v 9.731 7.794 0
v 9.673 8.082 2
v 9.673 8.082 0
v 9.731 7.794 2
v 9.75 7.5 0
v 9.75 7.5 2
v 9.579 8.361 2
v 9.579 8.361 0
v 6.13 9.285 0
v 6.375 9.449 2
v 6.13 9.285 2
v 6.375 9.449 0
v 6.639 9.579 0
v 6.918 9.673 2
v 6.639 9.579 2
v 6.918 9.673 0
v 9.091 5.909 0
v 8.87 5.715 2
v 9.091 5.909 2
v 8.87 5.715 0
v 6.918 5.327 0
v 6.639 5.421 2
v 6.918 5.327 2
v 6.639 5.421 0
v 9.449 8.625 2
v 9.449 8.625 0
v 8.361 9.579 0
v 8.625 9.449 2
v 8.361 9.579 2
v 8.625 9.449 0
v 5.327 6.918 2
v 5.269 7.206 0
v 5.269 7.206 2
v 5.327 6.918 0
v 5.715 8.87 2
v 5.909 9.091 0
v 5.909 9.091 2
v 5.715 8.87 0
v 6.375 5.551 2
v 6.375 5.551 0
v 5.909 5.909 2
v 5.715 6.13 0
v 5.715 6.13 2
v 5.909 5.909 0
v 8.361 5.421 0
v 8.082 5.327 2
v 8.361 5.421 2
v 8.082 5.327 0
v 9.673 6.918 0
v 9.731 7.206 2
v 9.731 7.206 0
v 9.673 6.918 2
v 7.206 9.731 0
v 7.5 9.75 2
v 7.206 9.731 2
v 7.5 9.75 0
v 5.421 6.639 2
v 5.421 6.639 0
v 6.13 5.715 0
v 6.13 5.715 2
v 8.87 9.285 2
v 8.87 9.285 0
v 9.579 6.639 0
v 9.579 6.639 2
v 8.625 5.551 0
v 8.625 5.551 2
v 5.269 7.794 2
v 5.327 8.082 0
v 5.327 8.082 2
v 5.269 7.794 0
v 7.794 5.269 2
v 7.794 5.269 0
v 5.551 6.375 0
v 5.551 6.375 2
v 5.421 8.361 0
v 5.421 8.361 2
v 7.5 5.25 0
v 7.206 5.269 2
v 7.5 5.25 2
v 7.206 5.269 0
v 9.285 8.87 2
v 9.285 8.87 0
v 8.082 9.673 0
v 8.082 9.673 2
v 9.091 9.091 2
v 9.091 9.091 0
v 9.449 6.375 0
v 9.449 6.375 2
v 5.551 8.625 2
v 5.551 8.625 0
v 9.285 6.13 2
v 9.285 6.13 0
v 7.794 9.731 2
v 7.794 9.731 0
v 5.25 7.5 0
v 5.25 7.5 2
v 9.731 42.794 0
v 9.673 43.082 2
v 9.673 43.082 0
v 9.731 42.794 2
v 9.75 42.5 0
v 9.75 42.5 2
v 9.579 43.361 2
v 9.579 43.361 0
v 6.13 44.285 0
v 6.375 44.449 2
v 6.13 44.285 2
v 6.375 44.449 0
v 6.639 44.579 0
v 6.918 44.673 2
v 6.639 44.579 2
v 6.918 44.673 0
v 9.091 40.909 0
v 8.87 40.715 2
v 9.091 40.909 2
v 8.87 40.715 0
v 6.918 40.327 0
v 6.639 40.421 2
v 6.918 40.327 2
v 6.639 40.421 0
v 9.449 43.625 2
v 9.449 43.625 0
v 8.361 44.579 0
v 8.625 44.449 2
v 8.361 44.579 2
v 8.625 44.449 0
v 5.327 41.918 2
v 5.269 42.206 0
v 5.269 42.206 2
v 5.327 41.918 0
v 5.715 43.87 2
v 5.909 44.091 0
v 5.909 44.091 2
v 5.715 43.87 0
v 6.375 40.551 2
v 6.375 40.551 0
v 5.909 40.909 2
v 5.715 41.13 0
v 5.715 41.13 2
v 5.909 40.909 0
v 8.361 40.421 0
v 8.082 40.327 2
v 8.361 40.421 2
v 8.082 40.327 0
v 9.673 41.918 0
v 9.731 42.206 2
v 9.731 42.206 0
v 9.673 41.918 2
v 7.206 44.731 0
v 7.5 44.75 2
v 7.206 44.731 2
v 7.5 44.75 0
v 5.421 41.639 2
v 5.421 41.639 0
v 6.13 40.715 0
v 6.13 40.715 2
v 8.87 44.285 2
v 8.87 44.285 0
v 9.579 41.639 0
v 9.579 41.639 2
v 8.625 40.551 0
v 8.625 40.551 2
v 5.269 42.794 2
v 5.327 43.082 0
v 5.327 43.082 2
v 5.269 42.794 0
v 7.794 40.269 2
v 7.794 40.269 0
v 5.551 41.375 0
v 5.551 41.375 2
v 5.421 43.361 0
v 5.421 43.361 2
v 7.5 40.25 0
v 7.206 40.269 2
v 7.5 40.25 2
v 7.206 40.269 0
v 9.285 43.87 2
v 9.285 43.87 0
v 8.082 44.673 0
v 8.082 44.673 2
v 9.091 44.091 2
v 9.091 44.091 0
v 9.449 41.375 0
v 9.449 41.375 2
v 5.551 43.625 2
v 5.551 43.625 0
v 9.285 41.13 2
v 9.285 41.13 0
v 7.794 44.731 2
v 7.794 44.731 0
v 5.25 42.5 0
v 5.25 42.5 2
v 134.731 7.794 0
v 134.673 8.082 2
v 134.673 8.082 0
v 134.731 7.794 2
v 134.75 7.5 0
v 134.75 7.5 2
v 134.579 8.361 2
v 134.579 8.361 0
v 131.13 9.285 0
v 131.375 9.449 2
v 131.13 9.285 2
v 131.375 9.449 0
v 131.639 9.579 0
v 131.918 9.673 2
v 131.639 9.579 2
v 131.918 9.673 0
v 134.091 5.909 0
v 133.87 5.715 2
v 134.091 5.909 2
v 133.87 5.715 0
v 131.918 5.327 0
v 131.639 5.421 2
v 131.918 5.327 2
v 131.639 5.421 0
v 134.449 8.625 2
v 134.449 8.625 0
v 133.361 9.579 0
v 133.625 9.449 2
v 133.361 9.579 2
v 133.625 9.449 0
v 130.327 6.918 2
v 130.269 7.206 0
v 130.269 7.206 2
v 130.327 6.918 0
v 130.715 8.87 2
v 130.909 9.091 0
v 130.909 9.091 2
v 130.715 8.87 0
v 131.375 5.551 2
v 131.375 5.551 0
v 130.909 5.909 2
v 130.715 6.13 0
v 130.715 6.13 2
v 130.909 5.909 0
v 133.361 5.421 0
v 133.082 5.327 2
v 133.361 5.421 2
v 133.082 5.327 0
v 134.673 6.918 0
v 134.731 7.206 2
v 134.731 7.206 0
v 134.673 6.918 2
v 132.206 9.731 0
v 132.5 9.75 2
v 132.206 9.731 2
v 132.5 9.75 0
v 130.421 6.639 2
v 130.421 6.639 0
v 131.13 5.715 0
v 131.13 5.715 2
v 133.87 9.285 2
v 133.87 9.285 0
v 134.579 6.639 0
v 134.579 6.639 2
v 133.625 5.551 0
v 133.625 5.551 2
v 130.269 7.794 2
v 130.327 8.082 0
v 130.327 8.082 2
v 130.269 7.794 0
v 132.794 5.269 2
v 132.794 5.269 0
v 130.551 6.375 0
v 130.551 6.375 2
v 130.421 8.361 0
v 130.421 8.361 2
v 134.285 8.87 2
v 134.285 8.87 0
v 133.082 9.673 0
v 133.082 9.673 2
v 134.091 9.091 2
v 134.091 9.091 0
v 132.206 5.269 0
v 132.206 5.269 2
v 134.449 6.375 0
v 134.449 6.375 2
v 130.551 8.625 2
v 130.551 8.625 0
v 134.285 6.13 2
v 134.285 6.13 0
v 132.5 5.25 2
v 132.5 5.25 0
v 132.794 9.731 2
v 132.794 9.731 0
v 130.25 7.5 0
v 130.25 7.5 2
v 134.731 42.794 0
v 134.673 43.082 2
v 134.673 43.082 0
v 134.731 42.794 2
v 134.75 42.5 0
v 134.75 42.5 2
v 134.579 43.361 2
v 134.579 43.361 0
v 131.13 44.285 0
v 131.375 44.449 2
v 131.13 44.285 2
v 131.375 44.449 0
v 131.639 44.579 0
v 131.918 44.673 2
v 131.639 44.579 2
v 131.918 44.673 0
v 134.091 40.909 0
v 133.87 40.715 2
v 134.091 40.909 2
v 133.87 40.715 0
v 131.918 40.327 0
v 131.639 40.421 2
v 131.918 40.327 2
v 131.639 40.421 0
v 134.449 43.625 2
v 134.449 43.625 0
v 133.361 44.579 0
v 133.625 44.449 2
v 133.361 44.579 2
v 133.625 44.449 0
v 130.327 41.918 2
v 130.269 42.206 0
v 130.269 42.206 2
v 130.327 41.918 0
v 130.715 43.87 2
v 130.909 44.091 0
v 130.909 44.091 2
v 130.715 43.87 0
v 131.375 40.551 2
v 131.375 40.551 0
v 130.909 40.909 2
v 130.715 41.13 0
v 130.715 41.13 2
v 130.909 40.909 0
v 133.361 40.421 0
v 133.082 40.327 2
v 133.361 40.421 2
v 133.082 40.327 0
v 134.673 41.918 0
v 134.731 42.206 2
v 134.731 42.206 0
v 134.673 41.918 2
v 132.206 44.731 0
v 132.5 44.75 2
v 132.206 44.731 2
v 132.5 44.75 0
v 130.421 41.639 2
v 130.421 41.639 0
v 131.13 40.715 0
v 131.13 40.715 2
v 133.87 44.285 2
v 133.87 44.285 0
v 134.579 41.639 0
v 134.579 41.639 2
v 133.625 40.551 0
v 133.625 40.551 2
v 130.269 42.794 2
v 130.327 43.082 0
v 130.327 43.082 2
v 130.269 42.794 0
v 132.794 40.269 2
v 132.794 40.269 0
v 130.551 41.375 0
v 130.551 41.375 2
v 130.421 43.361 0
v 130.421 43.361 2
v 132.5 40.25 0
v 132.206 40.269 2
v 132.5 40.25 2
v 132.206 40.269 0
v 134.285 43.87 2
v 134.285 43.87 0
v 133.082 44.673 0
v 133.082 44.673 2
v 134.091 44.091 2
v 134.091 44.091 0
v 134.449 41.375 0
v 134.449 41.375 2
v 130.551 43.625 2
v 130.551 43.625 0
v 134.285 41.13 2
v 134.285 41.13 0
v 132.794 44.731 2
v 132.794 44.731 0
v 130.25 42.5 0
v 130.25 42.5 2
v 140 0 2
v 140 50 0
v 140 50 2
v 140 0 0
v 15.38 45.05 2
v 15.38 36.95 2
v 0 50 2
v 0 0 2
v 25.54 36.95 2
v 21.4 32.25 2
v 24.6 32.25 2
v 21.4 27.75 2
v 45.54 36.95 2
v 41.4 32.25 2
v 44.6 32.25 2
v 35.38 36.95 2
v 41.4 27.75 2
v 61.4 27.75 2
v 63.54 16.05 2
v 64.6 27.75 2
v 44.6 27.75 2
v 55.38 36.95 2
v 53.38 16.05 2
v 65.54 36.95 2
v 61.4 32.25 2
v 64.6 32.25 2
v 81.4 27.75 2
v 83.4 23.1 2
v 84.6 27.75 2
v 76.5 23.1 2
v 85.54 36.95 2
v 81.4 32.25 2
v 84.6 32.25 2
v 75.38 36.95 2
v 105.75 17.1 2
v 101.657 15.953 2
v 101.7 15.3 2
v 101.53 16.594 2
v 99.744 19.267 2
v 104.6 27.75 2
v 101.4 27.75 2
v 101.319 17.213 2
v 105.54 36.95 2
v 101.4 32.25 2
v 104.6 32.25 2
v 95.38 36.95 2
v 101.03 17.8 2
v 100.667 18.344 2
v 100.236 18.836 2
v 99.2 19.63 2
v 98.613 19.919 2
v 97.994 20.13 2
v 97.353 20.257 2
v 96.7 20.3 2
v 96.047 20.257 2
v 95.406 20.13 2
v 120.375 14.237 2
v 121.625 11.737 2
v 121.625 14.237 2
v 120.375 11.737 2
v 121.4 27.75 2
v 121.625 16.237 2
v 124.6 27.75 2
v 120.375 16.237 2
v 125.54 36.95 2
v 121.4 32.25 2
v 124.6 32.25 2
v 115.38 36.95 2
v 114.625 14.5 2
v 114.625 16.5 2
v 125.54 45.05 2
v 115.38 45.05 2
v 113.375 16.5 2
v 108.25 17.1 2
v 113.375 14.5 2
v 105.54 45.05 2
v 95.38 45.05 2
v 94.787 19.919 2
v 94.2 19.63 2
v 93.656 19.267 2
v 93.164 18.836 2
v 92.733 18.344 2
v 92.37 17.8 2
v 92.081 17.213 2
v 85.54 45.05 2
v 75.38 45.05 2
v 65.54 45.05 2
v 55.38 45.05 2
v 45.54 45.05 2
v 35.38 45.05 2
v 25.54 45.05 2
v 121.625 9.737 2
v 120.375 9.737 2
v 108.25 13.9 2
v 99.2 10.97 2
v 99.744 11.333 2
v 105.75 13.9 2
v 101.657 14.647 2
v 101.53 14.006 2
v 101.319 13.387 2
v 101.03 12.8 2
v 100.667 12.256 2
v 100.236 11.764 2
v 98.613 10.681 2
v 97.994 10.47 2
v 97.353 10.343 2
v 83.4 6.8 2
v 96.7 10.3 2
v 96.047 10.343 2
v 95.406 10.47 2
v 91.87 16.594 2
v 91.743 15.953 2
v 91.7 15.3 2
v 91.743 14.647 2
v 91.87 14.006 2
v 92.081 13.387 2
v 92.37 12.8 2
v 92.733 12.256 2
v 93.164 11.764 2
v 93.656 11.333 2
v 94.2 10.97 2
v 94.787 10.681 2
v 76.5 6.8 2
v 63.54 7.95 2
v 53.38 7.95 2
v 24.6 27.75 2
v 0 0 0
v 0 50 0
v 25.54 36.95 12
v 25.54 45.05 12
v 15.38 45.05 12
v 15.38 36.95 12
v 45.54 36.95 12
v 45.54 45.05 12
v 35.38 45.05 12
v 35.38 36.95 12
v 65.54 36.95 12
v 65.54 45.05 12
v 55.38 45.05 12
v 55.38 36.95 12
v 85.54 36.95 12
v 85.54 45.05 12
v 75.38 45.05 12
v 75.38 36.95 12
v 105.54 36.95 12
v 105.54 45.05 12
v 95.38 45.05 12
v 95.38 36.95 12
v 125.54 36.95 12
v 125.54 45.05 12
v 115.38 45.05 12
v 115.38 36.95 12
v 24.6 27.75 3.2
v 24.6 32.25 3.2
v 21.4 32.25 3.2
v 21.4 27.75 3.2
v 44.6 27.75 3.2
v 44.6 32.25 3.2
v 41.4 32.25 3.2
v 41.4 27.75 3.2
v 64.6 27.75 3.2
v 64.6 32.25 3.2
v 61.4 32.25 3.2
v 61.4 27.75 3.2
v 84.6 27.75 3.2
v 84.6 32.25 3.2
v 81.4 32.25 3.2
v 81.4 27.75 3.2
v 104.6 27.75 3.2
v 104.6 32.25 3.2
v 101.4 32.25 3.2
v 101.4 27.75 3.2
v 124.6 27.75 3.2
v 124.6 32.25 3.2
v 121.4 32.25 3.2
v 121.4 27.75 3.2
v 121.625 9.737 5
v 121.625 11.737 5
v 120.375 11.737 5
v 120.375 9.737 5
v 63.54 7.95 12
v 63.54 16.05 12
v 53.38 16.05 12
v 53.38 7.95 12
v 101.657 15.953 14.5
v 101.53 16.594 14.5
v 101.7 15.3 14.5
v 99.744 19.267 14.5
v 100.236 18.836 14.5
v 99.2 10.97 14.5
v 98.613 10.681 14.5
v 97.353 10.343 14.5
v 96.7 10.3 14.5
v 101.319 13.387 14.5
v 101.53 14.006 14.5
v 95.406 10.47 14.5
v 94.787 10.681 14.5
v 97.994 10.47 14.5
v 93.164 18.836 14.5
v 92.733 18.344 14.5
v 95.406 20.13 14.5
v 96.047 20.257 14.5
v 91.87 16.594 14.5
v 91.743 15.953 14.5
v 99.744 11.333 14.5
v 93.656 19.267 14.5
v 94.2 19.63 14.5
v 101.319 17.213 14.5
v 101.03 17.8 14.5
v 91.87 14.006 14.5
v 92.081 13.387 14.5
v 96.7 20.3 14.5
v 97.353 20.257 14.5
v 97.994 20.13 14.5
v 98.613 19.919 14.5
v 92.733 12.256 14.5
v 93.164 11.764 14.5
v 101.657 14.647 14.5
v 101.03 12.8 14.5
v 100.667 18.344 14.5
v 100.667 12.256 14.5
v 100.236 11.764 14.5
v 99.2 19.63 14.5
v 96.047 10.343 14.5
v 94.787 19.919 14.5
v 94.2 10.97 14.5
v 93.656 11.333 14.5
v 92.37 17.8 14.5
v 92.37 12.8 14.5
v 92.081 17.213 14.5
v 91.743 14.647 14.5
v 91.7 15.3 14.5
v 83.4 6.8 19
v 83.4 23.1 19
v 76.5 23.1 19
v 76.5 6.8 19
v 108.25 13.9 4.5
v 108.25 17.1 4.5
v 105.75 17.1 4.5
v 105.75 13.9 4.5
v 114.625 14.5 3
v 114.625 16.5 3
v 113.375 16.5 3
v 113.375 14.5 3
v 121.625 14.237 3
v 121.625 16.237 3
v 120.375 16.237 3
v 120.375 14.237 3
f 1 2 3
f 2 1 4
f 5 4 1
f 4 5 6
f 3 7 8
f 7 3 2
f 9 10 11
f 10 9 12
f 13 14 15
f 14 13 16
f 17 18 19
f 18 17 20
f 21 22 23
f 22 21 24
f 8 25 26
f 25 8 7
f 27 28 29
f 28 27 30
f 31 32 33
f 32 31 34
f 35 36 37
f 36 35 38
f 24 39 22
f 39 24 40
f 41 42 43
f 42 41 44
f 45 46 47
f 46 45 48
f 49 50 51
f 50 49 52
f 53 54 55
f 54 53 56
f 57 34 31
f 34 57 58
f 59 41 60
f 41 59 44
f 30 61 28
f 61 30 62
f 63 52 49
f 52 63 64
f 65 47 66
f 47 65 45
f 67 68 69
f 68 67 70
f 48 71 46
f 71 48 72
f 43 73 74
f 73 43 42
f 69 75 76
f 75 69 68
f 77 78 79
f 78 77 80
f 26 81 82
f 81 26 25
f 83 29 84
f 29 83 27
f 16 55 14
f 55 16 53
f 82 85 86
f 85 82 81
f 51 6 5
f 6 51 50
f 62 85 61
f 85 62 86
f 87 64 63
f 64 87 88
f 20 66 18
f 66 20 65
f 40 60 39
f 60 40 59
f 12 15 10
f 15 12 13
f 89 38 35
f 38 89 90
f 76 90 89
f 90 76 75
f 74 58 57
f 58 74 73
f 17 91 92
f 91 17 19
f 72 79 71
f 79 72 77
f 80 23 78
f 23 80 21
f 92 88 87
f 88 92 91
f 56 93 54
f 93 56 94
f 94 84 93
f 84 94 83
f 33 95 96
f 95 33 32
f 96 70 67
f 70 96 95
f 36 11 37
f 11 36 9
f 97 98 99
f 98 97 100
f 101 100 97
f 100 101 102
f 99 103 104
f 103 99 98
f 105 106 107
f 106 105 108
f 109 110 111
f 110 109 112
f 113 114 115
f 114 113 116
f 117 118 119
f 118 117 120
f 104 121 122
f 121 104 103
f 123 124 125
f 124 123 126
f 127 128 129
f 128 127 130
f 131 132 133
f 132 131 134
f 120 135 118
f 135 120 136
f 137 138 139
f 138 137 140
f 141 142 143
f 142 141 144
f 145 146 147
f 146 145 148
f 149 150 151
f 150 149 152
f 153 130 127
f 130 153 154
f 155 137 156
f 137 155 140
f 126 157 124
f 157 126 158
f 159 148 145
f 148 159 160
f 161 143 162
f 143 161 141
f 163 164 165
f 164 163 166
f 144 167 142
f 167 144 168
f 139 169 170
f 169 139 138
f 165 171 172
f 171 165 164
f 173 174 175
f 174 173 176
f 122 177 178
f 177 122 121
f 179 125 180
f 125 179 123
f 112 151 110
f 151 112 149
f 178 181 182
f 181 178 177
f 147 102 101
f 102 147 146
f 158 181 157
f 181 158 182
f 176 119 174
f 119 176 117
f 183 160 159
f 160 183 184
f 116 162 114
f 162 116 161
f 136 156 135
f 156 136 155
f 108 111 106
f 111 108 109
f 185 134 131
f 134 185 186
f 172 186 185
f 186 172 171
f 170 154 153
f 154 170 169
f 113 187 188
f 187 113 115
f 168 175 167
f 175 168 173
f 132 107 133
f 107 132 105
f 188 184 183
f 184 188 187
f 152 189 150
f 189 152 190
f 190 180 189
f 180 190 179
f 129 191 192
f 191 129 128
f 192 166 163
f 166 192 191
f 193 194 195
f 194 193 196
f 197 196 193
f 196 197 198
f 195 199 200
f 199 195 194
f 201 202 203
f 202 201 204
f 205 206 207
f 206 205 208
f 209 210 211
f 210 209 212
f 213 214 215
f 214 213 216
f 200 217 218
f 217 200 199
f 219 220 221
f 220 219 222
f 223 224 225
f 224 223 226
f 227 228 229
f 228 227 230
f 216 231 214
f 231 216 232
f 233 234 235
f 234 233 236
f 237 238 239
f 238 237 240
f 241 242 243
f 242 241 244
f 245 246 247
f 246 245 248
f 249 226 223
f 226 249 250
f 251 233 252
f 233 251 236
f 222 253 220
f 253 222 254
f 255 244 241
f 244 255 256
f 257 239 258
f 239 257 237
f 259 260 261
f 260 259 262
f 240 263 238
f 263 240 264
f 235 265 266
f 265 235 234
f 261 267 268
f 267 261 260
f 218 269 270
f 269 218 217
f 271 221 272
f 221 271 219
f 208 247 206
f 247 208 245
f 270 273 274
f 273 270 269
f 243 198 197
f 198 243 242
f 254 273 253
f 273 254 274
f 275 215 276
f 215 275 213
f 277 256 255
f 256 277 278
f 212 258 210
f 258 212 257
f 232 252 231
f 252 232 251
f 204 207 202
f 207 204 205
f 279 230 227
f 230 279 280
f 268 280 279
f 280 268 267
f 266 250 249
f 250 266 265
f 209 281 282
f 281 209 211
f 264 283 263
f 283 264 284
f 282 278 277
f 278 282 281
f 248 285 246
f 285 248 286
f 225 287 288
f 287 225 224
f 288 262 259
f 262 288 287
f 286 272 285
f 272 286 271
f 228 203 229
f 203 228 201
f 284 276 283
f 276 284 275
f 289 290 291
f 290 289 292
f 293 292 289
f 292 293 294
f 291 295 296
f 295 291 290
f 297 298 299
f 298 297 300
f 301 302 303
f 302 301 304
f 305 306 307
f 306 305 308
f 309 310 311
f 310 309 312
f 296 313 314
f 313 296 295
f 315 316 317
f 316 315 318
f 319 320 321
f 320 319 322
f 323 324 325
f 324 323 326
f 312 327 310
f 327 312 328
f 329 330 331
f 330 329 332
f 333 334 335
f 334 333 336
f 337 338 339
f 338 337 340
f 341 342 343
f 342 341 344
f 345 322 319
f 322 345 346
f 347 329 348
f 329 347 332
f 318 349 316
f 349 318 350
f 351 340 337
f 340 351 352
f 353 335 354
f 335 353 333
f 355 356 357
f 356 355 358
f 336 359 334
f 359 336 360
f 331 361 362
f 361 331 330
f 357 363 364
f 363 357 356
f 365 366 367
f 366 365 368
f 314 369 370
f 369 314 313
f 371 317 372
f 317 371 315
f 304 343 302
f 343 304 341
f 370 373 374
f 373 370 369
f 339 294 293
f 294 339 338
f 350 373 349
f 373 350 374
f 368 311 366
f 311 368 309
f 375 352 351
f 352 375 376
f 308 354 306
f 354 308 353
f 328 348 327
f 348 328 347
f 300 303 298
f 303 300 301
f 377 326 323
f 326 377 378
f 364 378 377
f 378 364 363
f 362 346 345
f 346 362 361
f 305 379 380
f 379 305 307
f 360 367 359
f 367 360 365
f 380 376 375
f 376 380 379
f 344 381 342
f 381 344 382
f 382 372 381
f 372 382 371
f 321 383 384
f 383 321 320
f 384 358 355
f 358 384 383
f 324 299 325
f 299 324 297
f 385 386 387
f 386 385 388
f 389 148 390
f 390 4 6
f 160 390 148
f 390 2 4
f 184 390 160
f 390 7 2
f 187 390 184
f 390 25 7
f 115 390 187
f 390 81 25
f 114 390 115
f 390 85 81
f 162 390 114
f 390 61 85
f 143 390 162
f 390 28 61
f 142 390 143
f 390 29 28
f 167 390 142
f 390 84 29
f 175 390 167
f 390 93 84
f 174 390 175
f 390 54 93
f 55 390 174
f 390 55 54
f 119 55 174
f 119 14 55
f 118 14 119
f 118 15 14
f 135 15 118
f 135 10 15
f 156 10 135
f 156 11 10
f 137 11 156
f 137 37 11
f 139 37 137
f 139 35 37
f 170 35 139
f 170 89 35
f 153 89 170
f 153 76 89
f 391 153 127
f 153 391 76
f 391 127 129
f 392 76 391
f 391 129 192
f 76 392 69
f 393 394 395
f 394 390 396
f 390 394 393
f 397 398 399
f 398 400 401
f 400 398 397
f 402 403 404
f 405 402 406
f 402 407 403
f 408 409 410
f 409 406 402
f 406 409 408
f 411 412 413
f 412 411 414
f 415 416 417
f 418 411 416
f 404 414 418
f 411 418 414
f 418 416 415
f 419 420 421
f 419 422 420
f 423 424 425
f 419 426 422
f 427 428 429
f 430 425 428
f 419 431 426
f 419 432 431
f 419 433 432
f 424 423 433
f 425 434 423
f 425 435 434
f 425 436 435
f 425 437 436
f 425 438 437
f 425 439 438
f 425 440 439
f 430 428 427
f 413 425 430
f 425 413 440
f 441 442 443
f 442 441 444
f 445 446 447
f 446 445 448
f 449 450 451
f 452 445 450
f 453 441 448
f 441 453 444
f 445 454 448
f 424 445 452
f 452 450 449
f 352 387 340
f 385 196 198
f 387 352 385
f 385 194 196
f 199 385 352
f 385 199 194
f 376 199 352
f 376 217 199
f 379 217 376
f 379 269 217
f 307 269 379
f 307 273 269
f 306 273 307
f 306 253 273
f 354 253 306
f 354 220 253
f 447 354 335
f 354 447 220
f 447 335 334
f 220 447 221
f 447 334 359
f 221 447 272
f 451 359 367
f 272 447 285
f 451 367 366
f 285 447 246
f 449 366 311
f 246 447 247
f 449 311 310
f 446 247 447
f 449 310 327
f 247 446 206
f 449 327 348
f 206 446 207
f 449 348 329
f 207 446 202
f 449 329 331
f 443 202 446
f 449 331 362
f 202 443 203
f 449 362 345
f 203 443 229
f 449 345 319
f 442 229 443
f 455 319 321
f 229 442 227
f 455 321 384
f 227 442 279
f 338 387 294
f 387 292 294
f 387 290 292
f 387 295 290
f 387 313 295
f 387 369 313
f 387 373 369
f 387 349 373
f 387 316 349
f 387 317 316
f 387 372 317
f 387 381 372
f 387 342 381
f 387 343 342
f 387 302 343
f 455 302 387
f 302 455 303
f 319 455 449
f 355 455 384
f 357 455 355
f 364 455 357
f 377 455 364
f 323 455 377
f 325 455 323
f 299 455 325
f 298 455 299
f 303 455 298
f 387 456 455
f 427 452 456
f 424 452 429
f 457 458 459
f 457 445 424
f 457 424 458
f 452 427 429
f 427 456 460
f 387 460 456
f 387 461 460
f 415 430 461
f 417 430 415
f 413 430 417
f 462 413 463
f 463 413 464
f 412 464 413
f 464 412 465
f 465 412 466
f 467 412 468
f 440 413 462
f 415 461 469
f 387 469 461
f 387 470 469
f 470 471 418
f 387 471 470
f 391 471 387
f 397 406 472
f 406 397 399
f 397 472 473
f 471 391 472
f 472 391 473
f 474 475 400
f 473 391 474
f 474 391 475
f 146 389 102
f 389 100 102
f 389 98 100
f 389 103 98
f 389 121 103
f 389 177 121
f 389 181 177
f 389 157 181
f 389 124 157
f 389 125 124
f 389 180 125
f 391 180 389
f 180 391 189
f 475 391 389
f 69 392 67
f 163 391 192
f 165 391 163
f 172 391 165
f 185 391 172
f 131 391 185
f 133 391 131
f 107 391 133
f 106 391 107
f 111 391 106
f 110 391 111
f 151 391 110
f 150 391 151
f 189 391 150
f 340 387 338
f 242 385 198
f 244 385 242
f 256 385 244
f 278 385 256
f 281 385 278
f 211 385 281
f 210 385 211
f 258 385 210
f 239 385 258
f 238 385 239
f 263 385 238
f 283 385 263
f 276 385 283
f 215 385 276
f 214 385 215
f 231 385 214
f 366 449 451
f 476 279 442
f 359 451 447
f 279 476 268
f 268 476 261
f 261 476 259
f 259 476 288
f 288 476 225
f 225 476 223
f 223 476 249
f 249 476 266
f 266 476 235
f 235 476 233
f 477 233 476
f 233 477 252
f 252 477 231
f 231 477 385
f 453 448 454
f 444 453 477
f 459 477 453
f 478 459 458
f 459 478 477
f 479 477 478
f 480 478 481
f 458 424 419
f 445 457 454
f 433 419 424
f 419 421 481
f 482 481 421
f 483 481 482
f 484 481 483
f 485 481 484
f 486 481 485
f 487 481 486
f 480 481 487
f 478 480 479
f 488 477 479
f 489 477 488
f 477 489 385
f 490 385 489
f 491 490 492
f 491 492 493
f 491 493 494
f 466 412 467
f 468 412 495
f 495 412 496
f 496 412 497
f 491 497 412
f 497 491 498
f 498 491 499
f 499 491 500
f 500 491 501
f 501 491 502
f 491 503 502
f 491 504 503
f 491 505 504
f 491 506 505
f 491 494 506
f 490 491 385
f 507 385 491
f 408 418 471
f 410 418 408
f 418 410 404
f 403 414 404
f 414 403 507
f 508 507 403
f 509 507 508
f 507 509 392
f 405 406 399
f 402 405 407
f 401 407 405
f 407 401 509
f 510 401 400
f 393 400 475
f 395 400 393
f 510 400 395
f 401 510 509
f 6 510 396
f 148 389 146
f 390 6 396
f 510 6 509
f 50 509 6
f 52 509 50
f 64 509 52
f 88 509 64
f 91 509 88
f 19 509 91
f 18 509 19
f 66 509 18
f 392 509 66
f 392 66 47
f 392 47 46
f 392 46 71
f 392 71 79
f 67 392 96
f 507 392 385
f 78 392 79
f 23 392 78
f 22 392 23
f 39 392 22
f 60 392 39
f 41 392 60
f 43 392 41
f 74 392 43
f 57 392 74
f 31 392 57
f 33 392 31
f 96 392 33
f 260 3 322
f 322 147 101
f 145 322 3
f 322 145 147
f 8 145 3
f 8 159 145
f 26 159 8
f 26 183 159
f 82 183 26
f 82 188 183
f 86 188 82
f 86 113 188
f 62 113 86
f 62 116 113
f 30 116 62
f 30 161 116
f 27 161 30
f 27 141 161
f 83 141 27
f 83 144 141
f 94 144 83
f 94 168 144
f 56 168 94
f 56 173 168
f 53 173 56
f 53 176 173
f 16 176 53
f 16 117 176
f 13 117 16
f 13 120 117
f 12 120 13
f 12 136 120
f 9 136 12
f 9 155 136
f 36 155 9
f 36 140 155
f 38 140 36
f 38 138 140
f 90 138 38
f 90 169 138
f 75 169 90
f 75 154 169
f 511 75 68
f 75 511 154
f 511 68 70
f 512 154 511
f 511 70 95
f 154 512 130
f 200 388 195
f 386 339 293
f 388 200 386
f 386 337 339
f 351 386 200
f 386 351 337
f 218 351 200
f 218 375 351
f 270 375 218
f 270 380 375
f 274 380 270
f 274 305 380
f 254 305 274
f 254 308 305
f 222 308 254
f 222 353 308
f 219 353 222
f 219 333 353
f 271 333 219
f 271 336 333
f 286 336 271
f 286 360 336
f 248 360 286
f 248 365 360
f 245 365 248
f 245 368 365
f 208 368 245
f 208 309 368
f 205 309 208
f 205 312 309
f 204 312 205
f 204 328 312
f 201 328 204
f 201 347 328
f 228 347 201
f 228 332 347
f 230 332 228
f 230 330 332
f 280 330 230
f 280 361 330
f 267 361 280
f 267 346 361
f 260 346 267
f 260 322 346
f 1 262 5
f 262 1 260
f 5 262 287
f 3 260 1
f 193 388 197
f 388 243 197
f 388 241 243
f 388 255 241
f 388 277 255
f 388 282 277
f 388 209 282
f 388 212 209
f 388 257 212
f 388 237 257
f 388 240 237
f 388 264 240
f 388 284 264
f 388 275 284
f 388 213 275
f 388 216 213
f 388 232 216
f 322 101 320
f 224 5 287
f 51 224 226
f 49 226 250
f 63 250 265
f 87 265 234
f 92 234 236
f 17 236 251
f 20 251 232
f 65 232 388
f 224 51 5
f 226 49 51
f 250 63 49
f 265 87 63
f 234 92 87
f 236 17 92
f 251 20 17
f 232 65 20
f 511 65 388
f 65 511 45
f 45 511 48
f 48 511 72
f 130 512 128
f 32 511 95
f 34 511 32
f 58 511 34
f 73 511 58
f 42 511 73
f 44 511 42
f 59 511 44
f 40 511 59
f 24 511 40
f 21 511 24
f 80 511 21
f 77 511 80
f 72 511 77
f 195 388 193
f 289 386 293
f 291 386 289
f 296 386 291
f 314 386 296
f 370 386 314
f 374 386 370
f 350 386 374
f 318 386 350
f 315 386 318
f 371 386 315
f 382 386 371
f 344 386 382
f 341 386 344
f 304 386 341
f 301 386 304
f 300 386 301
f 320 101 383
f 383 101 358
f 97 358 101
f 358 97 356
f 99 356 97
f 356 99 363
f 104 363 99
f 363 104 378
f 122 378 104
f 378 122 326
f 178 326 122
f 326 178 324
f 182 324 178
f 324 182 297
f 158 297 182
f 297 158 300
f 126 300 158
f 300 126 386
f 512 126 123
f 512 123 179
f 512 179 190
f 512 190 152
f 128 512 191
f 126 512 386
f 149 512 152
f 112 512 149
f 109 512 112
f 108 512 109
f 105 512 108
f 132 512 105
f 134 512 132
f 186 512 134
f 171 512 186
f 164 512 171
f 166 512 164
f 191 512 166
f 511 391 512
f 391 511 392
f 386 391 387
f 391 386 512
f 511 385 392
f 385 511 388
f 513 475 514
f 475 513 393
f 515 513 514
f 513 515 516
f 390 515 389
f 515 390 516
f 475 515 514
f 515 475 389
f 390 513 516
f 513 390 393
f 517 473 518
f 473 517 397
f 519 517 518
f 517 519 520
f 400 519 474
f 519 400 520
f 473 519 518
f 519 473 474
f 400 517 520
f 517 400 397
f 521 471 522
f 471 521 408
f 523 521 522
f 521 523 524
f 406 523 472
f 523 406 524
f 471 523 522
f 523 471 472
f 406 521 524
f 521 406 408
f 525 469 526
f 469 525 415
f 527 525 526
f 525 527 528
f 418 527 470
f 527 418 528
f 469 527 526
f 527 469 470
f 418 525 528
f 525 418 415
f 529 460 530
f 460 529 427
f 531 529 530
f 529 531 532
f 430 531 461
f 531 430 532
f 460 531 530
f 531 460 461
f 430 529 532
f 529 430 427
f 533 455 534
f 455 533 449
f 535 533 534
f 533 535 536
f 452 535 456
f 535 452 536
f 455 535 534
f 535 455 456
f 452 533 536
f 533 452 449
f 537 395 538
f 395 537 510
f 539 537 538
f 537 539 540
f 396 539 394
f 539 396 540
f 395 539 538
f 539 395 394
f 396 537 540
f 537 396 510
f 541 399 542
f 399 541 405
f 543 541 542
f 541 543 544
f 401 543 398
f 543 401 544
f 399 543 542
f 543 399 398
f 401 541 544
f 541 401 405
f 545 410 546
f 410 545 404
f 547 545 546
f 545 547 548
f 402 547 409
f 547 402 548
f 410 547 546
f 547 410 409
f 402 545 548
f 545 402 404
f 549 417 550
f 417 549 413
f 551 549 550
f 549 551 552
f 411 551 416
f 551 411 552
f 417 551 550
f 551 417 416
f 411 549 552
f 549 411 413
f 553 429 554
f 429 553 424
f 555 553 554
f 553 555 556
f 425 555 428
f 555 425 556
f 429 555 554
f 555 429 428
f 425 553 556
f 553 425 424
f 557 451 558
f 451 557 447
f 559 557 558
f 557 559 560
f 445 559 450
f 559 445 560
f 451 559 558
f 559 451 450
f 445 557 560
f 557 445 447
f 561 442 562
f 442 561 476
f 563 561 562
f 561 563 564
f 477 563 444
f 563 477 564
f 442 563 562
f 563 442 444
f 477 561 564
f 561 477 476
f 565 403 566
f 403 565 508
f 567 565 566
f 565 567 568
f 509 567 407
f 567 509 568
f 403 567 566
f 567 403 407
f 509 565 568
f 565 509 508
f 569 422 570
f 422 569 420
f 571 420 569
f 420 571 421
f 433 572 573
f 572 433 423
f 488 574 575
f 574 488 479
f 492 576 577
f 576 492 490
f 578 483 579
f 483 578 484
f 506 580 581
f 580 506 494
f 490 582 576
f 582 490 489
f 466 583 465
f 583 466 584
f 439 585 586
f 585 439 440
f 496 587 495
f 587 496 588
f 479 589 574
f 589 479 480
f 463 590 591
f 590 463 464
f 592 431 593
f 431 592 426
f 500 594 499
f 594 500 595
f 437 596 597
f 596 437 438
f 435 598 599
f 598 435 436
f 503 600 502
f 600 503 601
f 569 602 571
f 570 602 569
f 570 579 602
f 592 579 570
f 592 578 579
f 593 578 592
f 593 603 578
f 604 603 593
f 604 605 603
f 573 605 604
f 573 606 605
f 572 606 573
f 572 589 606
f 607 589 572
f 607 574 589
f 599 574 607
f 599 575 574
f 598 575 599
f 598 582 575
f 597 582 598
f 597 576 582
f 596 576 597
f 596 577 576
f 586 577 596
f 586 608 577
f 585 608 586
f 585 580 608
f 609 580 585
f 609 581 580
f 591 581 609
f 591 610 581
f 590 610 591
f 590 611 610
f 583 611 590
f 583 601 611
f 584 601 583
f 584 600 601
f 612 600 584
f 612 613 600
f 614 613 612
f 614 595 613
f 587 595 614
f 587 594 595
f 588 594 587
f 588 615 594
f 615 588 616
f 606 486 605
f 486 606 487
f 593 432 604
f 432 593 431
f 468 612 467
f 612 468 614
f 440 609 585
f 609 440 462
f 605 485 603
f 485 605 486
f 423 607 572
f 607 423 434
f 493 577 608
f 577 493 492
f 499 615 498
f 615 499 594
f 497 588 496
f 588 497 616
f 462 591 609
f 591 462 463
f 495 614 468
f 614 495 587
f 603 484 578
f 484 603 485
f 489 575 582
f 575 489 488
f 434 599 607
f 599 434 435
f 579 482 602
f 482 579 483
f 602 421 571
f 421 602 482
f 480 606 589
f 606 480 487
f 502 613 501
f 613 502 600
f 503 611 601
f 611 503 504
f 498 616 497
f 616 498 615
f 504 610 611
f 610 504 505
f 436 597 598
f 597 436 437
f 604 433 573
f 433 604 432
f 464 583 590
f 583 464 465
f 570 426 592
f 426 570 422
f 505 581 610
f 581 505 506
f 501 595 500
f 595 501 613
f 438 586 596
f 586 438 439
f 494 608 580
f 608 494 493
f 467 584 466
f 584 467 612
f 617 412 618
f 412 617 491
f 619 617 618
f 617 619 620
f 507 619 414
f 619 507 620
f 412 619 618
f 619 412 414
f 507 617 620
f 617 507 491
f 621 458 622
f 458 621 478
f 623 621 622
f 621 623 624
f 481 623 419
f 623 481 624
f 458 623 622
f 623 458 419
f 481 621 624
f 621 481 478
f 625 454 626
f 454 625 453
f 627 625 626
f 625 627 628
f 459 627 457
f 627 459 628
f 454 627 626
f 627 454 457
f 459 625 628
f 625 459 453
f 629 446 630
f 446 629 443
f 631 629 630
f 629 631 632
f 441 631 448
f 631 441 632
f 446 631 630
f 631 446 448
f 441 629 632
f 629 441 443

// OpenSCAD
// Yahrzeit power-distribution board wall enclosure
// Units: millimeters
//
// Print the tray with its wall-facing surface on the bed. Print the cover
// front-face-down. The cover lifts straight away from the wall without
// disconnecting field wiring.

/* [Part] */
part = "pcb_mockup"; // [tray,cover,assembly,pcb_mockup,fit_coupon]

/* [PCB] */
board_w = 140;
board_h = 50;
board_t = 2.0;
board_hole_inset = 7.5;
board_hole_d = 4.5;

/* [Enclosure] */
wall = 2.4;
// 8.25 mm keeps the strengthened cover posts outside the PCB outline.
board_clearance = 8.25;
tray_w = board_w + 2 * board_clearance;
tray_h = board_h + 2 * board_clearance;
tray_t = 2.8;
max_component_h = 17.0;    // F1 holder plus inserted MINI fuse, provisional
component_clearance = 3.0;
inside_depth = max_component_h + component_clearance;
cover_front_t = 2.4;
cover_fit = 0.35;          // radial clearance around tray
corner_r = 3.0;

/* [PCB mounting] */
pcb_standoff_h = 6.0;
pcb_standoff_d = 8.0;
pcb_support_rib_w = 1.2;
pcb_support_gap = 0.15;    // ribs sit just below a normally seated PCB
m3_insert_od = 5.0;
m3_insert_length = 6.0;
m3_insert_pilot_d = 3.93;  // Zwmssl M3x6x5 package specification
m3_insert_pocket_depth = 6.15;
m3_clearance_d = 3.4;

/* [Cover mounting] */
cover_post_d = 8.0;
cover_post_edge = 4.0;
cover_screw_recess_d = 6.4;
cover_screw_recess_depth = 1.3;

/* [Wall mounting] */
ear_w = 13.0;
ear_h = 18.0;
ear_t = 3.2;
ear_hole_d = 4.2;
ear_center_y = 12.0;
mount_hole_dx = tray_w + ear_w;
mount_hole_dy = tray_h - 2 * ear_center_y;

/* [Cable access] */
output_slot_x0 = board_clearance + 10;
output_slot_w = board_w - 20;
output_slot_depth = 15.0;
input_slot_center_x = board_clearance + 58.5;
input_slot_w = 18.0;
input_slot_depth = 15.0;

/* [Visibility and ventilation] */
led_board_x = 121;
led_board_y_kicad = 39.2625;
// KiCad has y=0 at the board top; this model has y=0 at the bottom.
led_board_y = board_h - led_board_y_kicad;
led_window_d = 5.0;
mock_led_w = 1.25;         // rotated 0805 package footprint
mock_led_l = 2.0;
mock_led_h = 3.0;          // intentionally taller than the real LED
lightening_slot_w = 12;
lightening_slot_h = 5;
lightening_pitch_x = 16;
lightening_pitch_y = 11;

$fn = 48;

board_x = board_clearance;
board_y = board_clearance;
pcb_bottom_z = tray_t + pcb_standoff_h;
pcb_top_z = pcb_bottom_z + board_t;
cover_depth = pcb_top_z + inside_depth + cover_front_t;

// Convert a KiCad board Y coordinate to this model's bottom-up board Y.
function board_y_from_kicad(kicad_y) = board_h - kicad_y;

pcb_holes = [
    [board_x + board_hole_inset,           board_y + board_hole_inset],
    [board_x + board_w - board_hole_inset, board_y + board_hole_inset],
    [board_x + board_hole_inset,           board_y + board_h - board_hole_inset],
    [board_x + board_w - board_hole_inset, board_y + board_h - board_hole_inset]
];

cover_posts = [
    [cover_post_edge, cover_post_edge],
    [tray_w - cover_post_edge, cover_post_edge],
    [cover_post_edge, tray_h - cover_post_edge],
    [tray_w - cover_post_edge, tray_h - cover_post_edge]
];

wall_mount_holes = [
    [-ear_w / 2, ear_center_y],
    [tray_w + ear_w / 2, ear_center_y],
    [-ear_w / 2, tray_h - ear_center_y],
    [tray_w + ear_w / 2, tray_h - ear_center_y]
];

module rounded_box(size, r) {
    hull() {
        for (x = [r, size[0] - r])
            for (y = [r, size[1] - r])
                translate([x, y, 0]) cylinder(h=size[2], r=r);
    }
}

module insert_standoff(x, y, h, d=pcb_standoff_d) {
    // Sink slightly into the tray to guarantee one printable solid.
    translate([x, y, tray_t - 0.2])
        difference() {
            cylinder(h=h + 0.2, d=d);
            // The 6 mm insert reaches the tray surface in a 6 mm PCB
            // standoff. The tray itself remains as the closed bottom.
            translate([0, 0, h + 0.2 - m3_insert_pocket_depth])
                cylinder(h=m3_insert_pocket_depth + 0.2,
                         d=m3_insert_pilot_d);
        }
}

module mounting_ear(x, y) {
    // The 0.3 mm overlap with the tray avoids a merely tangent joint.
    translate([x - ear_w/2 - (x < 0 ? 0 : 0.3), y - ear_h/2, 0])
        difference() {
            rounded_box([ear_w + 0.3, ear_h, ear_t], 2.0);
            translate([ear_w/2 + (x < 0 ? 0 : 0.3), ear_h/2, -0.1])
                cylinder(h=ear_t + 0.2, d=ear_hole_d);
        }
}

module pcb_support_ribs() {
    rib_h = pcb_standoff_h + 0.1 - pcb_support_gap;

    // J2-J7: centered on KiCad y=11.5 and running between the upper
    // mounting standoffs. This misses the terminal pins at KiCad y=9.
    translate([board_x + board_hole_inset,
               board_y + board_y_from_kicad(11.5) - pcb_support_rib_w/2,
               tray_t - 0.1])
        cube([board_w - 2*board_hole_inset,
              pcb_support_rib_w,
              rib_h]);

    // J1: local support beneath the connector body, clear of its pin row.
    translate([board_x + 53,
               board_y + board_y_from_kicad(35.5) - pcb_support_rib_w/2,
               tray_t - 0.1])
        cube([11, pcb_support_rib_w, rib_h]);
}

module tray() {
    difference() {
        union() {
            rounded_box([tray_w, tray_h, tray_t], corner_r);

            for (p = wall_mount_holes)
                mounting_ear(p[0], p[1]);

            for (p = pcb_holes)
                insert_standoff(p[0], p[1], pcb_standoff_h);

            for (p = cover_posts)
                insert_standoff(p[0], p[1], pcb_top_z + inside_depth - tray_t,
                                 cover_post_d);

            pcb_support_ribs();
        }

        // Wall-screw access remains clear through the tray edge.
        for (p = wall_mount_holes)
            translate([p[0], p[1], -0.1])
                cylinder(h=ear_t + 0.2, d=ear_hole_d);
    }
}

module cover_shell() {
    difference() {
        rounded_box([tray_w + 2*(wall + cover_fit),
                     tray_h + 2*(wall + cover_fit),
                     cover_depth], corner_r + wall);

        // Open rear cavity; the cover fits around, rather than onto, the tray.
        translate([wall, wall, -0.1])
            rounded_box([tray_w + 2*cover_fit,
                         tray_h + 2*cover_fit,
                         cover_depth - cover_front_t + 0.1], corner_r);

        // Output wires leave at the board's upper edge. Opening reaches the
        // rear edge so the cover can be removed around connected wires.
        translate([wall + cover_fit + output_slot_x0,
                   tray_h + wall + cover_fit - 0.1,
                   -0.1])
            cube([output_slot_w, wall + 1, output_slot_depth + 0.1]);

        // Input wire opening below J1.
        translate([wall + cover_fit + input_slot_center_x - input_slot_w/2,
                   -0.1,
                   -0.1])
            cube([input_slot_w, wall + 1, input_slot_depth + 0.1]);

        // Front-facing M3 cover screws.
        for (p = cover_posts) {
            translate([wall + cover_fit + p[0],
                       wall + cover_fit + p[1],
                       cover_depth - cover_front_t - 0.1])
                cylinder(h=cover_front_t + 0.2, d=m3_clearance_d);
            translate([wall + cover_fit + p[0],
                       wall + cover_fit + p[1],
                       cover_depth - cover_screw_recess_depth])
                cylinder(h=cover_screw_recess_depth + 0.1,
                         d=cover_screw_recess_d);
        }

        // LED viewing hole.
        translate([wall + cover_fit + board_x + led_board_x,
                   wall + cover_fit + board_y + led_board_y,
                   cover_depth - cover_front_t - 0.1])
            cylinder(h=cover_front_t + 0.2, d=led_window_d);

        // Broad lightening pattern. Preserve solid material around LED1.
        for (x = [18 : lightening_pitch_x : tray_w - 18])
            for (y = [17 : lightening_pitch_y : tray_h - 15])
                if (sqrt(pow(x - (board_x + led_board_x), 2) +
                         pow(y - (board_y + led_board_y), 2)) > 11)
                    hull()
                        for (sx = [-1, 1])
                            translate([wall + cover_fit + x +
                                       sx*(lightening_slot_w-lightening_slot_h)/2,
                                       wall + cover_fit + y,
                                       cover_depth - cover_front_t - 0.1])
                                cylinder(h=cover_front_t + 0.2,
                                         d=lightening_slot_h, $fn=24);
    }
}

module printable_pcb_mockup() {
    union() {
        color("seagreen", 0.8)
            difference() {
                cube([board_w, board_h, board_t]);
                for (x = [board_hole_inset, board_w-board_hole_inset])
                    for (y = [board_hole_inset, board_h-board_hole_inset])
                        translate([x, y, -0.1])
                            cylinder(h=board_t+0.2, d=board_hole_d);
            }

        // This occupies the actual rotated 0805 package area. The extra
        // height makes LED1 easy to see through the cover window.
        color("limegreen")
            translate([led_board_x - mock_led_w/2,
                       led_board_y - mock_led_l/2,
                       board_t - 0.2])
                cube([mock_led_w, mock_led_l, mock_led_h + 0.2]);

        // J2-J7 terminal blocks. Footprint origins are at x=23..123,
        // KiCad y=9, with each footprint rotated 180 degrees.
        color("forestgreen")
            for (x = [23 : 20 : 123])
                translate([x - 7.62, 36.95, board_t - 0.2])
                    cube([10.16, 8.1, 10.2]);

        // J1 terminal block at KiCad (55.92, 38).
        color("forestgreen")
            translate([53.38, 7.95, board_t - 0.2])
                cube([10.16, 8.1, 10.2]);

        // C1: 10 mm diameter by 12.5 mm high, centered at the measured
        // KiCad coordinate (96.7, 34.7).
        color("navy")
            translate([96.7, board_y_from_kicad(34.7), board_t - 0.2])
                cylinder(h=12.7, d=10);

        // F1 holder with inserted MINI fuse. Measured KiCad bounds:
        // x=76.5..83.4, y=26.9..43.2.
        color("dimgray")
            translate([76.5, board_y_from_kicad(43.2), board_t - 0.2])
                cube([83.4-76.5, 43.2-26.9, max_component_h + 0.2]);

        // F2-F7 resettable PTCs, rotated 1812 packages.
        color("goldenrod")
            for (x = [23 : 20 : 123])
                translate([x - 1.6, 30 - 2.25, board_t - 0.2])
                    cube([3.2, 4.5, 1.4]);

        // C2, C3, and R1. Heights are conservative printable envelopes.
        color("sienna")
            translate([107 - 1.25, 15.5 - 1.6, board_t - 0.2])
                cube([2.5, 3.2, 2.7]);
        color("sienna")
            translate([114 - 0.625, 15.5 - 1.0, board_t - 0.2])
                cube([1.25, 2.0, 1.2]);
        color("sienna")
            translate([121 - 0.625, 15.2375 - 1.0, board_t - 0.2])
                cube([1.25, 2.0, 1.2]);
    }
}

module board_mockup() {
    translate([board_x, board_y, pcb_bottom_z])
        printable_pcb_mockup();
}

module fit_coupon() {
    // Small print for tuning the insert pilot and cover clearance.
    difference() {
        cube([32, 18, 9]);
        translate([8, 9, 9 - m3_insert_pocket_depth])
            cylinder(h=m3_insert_pocket_depth + 0.2,
                     d=m3_insert_pilot_d);
        translate([23, -0.1, 2]) cube([5 + 2*cover_fit, 8, 7.1]);
    }
}

if (part == "tray") tray();
if (part == "cover") cover_shell();
if (part == "pcb_mockup") printable_pcb_mockup();
if (part == "fit_coupon") fit_coupon();
if (part == "assembly") {
    color("gainsboro") tray();
    board_mockup();
    color([0.80, 0.85, 0.90, 0.35])
        translate([-wall-cover_fit, -wall-cover_fit, 0]) cover_shell();
}
